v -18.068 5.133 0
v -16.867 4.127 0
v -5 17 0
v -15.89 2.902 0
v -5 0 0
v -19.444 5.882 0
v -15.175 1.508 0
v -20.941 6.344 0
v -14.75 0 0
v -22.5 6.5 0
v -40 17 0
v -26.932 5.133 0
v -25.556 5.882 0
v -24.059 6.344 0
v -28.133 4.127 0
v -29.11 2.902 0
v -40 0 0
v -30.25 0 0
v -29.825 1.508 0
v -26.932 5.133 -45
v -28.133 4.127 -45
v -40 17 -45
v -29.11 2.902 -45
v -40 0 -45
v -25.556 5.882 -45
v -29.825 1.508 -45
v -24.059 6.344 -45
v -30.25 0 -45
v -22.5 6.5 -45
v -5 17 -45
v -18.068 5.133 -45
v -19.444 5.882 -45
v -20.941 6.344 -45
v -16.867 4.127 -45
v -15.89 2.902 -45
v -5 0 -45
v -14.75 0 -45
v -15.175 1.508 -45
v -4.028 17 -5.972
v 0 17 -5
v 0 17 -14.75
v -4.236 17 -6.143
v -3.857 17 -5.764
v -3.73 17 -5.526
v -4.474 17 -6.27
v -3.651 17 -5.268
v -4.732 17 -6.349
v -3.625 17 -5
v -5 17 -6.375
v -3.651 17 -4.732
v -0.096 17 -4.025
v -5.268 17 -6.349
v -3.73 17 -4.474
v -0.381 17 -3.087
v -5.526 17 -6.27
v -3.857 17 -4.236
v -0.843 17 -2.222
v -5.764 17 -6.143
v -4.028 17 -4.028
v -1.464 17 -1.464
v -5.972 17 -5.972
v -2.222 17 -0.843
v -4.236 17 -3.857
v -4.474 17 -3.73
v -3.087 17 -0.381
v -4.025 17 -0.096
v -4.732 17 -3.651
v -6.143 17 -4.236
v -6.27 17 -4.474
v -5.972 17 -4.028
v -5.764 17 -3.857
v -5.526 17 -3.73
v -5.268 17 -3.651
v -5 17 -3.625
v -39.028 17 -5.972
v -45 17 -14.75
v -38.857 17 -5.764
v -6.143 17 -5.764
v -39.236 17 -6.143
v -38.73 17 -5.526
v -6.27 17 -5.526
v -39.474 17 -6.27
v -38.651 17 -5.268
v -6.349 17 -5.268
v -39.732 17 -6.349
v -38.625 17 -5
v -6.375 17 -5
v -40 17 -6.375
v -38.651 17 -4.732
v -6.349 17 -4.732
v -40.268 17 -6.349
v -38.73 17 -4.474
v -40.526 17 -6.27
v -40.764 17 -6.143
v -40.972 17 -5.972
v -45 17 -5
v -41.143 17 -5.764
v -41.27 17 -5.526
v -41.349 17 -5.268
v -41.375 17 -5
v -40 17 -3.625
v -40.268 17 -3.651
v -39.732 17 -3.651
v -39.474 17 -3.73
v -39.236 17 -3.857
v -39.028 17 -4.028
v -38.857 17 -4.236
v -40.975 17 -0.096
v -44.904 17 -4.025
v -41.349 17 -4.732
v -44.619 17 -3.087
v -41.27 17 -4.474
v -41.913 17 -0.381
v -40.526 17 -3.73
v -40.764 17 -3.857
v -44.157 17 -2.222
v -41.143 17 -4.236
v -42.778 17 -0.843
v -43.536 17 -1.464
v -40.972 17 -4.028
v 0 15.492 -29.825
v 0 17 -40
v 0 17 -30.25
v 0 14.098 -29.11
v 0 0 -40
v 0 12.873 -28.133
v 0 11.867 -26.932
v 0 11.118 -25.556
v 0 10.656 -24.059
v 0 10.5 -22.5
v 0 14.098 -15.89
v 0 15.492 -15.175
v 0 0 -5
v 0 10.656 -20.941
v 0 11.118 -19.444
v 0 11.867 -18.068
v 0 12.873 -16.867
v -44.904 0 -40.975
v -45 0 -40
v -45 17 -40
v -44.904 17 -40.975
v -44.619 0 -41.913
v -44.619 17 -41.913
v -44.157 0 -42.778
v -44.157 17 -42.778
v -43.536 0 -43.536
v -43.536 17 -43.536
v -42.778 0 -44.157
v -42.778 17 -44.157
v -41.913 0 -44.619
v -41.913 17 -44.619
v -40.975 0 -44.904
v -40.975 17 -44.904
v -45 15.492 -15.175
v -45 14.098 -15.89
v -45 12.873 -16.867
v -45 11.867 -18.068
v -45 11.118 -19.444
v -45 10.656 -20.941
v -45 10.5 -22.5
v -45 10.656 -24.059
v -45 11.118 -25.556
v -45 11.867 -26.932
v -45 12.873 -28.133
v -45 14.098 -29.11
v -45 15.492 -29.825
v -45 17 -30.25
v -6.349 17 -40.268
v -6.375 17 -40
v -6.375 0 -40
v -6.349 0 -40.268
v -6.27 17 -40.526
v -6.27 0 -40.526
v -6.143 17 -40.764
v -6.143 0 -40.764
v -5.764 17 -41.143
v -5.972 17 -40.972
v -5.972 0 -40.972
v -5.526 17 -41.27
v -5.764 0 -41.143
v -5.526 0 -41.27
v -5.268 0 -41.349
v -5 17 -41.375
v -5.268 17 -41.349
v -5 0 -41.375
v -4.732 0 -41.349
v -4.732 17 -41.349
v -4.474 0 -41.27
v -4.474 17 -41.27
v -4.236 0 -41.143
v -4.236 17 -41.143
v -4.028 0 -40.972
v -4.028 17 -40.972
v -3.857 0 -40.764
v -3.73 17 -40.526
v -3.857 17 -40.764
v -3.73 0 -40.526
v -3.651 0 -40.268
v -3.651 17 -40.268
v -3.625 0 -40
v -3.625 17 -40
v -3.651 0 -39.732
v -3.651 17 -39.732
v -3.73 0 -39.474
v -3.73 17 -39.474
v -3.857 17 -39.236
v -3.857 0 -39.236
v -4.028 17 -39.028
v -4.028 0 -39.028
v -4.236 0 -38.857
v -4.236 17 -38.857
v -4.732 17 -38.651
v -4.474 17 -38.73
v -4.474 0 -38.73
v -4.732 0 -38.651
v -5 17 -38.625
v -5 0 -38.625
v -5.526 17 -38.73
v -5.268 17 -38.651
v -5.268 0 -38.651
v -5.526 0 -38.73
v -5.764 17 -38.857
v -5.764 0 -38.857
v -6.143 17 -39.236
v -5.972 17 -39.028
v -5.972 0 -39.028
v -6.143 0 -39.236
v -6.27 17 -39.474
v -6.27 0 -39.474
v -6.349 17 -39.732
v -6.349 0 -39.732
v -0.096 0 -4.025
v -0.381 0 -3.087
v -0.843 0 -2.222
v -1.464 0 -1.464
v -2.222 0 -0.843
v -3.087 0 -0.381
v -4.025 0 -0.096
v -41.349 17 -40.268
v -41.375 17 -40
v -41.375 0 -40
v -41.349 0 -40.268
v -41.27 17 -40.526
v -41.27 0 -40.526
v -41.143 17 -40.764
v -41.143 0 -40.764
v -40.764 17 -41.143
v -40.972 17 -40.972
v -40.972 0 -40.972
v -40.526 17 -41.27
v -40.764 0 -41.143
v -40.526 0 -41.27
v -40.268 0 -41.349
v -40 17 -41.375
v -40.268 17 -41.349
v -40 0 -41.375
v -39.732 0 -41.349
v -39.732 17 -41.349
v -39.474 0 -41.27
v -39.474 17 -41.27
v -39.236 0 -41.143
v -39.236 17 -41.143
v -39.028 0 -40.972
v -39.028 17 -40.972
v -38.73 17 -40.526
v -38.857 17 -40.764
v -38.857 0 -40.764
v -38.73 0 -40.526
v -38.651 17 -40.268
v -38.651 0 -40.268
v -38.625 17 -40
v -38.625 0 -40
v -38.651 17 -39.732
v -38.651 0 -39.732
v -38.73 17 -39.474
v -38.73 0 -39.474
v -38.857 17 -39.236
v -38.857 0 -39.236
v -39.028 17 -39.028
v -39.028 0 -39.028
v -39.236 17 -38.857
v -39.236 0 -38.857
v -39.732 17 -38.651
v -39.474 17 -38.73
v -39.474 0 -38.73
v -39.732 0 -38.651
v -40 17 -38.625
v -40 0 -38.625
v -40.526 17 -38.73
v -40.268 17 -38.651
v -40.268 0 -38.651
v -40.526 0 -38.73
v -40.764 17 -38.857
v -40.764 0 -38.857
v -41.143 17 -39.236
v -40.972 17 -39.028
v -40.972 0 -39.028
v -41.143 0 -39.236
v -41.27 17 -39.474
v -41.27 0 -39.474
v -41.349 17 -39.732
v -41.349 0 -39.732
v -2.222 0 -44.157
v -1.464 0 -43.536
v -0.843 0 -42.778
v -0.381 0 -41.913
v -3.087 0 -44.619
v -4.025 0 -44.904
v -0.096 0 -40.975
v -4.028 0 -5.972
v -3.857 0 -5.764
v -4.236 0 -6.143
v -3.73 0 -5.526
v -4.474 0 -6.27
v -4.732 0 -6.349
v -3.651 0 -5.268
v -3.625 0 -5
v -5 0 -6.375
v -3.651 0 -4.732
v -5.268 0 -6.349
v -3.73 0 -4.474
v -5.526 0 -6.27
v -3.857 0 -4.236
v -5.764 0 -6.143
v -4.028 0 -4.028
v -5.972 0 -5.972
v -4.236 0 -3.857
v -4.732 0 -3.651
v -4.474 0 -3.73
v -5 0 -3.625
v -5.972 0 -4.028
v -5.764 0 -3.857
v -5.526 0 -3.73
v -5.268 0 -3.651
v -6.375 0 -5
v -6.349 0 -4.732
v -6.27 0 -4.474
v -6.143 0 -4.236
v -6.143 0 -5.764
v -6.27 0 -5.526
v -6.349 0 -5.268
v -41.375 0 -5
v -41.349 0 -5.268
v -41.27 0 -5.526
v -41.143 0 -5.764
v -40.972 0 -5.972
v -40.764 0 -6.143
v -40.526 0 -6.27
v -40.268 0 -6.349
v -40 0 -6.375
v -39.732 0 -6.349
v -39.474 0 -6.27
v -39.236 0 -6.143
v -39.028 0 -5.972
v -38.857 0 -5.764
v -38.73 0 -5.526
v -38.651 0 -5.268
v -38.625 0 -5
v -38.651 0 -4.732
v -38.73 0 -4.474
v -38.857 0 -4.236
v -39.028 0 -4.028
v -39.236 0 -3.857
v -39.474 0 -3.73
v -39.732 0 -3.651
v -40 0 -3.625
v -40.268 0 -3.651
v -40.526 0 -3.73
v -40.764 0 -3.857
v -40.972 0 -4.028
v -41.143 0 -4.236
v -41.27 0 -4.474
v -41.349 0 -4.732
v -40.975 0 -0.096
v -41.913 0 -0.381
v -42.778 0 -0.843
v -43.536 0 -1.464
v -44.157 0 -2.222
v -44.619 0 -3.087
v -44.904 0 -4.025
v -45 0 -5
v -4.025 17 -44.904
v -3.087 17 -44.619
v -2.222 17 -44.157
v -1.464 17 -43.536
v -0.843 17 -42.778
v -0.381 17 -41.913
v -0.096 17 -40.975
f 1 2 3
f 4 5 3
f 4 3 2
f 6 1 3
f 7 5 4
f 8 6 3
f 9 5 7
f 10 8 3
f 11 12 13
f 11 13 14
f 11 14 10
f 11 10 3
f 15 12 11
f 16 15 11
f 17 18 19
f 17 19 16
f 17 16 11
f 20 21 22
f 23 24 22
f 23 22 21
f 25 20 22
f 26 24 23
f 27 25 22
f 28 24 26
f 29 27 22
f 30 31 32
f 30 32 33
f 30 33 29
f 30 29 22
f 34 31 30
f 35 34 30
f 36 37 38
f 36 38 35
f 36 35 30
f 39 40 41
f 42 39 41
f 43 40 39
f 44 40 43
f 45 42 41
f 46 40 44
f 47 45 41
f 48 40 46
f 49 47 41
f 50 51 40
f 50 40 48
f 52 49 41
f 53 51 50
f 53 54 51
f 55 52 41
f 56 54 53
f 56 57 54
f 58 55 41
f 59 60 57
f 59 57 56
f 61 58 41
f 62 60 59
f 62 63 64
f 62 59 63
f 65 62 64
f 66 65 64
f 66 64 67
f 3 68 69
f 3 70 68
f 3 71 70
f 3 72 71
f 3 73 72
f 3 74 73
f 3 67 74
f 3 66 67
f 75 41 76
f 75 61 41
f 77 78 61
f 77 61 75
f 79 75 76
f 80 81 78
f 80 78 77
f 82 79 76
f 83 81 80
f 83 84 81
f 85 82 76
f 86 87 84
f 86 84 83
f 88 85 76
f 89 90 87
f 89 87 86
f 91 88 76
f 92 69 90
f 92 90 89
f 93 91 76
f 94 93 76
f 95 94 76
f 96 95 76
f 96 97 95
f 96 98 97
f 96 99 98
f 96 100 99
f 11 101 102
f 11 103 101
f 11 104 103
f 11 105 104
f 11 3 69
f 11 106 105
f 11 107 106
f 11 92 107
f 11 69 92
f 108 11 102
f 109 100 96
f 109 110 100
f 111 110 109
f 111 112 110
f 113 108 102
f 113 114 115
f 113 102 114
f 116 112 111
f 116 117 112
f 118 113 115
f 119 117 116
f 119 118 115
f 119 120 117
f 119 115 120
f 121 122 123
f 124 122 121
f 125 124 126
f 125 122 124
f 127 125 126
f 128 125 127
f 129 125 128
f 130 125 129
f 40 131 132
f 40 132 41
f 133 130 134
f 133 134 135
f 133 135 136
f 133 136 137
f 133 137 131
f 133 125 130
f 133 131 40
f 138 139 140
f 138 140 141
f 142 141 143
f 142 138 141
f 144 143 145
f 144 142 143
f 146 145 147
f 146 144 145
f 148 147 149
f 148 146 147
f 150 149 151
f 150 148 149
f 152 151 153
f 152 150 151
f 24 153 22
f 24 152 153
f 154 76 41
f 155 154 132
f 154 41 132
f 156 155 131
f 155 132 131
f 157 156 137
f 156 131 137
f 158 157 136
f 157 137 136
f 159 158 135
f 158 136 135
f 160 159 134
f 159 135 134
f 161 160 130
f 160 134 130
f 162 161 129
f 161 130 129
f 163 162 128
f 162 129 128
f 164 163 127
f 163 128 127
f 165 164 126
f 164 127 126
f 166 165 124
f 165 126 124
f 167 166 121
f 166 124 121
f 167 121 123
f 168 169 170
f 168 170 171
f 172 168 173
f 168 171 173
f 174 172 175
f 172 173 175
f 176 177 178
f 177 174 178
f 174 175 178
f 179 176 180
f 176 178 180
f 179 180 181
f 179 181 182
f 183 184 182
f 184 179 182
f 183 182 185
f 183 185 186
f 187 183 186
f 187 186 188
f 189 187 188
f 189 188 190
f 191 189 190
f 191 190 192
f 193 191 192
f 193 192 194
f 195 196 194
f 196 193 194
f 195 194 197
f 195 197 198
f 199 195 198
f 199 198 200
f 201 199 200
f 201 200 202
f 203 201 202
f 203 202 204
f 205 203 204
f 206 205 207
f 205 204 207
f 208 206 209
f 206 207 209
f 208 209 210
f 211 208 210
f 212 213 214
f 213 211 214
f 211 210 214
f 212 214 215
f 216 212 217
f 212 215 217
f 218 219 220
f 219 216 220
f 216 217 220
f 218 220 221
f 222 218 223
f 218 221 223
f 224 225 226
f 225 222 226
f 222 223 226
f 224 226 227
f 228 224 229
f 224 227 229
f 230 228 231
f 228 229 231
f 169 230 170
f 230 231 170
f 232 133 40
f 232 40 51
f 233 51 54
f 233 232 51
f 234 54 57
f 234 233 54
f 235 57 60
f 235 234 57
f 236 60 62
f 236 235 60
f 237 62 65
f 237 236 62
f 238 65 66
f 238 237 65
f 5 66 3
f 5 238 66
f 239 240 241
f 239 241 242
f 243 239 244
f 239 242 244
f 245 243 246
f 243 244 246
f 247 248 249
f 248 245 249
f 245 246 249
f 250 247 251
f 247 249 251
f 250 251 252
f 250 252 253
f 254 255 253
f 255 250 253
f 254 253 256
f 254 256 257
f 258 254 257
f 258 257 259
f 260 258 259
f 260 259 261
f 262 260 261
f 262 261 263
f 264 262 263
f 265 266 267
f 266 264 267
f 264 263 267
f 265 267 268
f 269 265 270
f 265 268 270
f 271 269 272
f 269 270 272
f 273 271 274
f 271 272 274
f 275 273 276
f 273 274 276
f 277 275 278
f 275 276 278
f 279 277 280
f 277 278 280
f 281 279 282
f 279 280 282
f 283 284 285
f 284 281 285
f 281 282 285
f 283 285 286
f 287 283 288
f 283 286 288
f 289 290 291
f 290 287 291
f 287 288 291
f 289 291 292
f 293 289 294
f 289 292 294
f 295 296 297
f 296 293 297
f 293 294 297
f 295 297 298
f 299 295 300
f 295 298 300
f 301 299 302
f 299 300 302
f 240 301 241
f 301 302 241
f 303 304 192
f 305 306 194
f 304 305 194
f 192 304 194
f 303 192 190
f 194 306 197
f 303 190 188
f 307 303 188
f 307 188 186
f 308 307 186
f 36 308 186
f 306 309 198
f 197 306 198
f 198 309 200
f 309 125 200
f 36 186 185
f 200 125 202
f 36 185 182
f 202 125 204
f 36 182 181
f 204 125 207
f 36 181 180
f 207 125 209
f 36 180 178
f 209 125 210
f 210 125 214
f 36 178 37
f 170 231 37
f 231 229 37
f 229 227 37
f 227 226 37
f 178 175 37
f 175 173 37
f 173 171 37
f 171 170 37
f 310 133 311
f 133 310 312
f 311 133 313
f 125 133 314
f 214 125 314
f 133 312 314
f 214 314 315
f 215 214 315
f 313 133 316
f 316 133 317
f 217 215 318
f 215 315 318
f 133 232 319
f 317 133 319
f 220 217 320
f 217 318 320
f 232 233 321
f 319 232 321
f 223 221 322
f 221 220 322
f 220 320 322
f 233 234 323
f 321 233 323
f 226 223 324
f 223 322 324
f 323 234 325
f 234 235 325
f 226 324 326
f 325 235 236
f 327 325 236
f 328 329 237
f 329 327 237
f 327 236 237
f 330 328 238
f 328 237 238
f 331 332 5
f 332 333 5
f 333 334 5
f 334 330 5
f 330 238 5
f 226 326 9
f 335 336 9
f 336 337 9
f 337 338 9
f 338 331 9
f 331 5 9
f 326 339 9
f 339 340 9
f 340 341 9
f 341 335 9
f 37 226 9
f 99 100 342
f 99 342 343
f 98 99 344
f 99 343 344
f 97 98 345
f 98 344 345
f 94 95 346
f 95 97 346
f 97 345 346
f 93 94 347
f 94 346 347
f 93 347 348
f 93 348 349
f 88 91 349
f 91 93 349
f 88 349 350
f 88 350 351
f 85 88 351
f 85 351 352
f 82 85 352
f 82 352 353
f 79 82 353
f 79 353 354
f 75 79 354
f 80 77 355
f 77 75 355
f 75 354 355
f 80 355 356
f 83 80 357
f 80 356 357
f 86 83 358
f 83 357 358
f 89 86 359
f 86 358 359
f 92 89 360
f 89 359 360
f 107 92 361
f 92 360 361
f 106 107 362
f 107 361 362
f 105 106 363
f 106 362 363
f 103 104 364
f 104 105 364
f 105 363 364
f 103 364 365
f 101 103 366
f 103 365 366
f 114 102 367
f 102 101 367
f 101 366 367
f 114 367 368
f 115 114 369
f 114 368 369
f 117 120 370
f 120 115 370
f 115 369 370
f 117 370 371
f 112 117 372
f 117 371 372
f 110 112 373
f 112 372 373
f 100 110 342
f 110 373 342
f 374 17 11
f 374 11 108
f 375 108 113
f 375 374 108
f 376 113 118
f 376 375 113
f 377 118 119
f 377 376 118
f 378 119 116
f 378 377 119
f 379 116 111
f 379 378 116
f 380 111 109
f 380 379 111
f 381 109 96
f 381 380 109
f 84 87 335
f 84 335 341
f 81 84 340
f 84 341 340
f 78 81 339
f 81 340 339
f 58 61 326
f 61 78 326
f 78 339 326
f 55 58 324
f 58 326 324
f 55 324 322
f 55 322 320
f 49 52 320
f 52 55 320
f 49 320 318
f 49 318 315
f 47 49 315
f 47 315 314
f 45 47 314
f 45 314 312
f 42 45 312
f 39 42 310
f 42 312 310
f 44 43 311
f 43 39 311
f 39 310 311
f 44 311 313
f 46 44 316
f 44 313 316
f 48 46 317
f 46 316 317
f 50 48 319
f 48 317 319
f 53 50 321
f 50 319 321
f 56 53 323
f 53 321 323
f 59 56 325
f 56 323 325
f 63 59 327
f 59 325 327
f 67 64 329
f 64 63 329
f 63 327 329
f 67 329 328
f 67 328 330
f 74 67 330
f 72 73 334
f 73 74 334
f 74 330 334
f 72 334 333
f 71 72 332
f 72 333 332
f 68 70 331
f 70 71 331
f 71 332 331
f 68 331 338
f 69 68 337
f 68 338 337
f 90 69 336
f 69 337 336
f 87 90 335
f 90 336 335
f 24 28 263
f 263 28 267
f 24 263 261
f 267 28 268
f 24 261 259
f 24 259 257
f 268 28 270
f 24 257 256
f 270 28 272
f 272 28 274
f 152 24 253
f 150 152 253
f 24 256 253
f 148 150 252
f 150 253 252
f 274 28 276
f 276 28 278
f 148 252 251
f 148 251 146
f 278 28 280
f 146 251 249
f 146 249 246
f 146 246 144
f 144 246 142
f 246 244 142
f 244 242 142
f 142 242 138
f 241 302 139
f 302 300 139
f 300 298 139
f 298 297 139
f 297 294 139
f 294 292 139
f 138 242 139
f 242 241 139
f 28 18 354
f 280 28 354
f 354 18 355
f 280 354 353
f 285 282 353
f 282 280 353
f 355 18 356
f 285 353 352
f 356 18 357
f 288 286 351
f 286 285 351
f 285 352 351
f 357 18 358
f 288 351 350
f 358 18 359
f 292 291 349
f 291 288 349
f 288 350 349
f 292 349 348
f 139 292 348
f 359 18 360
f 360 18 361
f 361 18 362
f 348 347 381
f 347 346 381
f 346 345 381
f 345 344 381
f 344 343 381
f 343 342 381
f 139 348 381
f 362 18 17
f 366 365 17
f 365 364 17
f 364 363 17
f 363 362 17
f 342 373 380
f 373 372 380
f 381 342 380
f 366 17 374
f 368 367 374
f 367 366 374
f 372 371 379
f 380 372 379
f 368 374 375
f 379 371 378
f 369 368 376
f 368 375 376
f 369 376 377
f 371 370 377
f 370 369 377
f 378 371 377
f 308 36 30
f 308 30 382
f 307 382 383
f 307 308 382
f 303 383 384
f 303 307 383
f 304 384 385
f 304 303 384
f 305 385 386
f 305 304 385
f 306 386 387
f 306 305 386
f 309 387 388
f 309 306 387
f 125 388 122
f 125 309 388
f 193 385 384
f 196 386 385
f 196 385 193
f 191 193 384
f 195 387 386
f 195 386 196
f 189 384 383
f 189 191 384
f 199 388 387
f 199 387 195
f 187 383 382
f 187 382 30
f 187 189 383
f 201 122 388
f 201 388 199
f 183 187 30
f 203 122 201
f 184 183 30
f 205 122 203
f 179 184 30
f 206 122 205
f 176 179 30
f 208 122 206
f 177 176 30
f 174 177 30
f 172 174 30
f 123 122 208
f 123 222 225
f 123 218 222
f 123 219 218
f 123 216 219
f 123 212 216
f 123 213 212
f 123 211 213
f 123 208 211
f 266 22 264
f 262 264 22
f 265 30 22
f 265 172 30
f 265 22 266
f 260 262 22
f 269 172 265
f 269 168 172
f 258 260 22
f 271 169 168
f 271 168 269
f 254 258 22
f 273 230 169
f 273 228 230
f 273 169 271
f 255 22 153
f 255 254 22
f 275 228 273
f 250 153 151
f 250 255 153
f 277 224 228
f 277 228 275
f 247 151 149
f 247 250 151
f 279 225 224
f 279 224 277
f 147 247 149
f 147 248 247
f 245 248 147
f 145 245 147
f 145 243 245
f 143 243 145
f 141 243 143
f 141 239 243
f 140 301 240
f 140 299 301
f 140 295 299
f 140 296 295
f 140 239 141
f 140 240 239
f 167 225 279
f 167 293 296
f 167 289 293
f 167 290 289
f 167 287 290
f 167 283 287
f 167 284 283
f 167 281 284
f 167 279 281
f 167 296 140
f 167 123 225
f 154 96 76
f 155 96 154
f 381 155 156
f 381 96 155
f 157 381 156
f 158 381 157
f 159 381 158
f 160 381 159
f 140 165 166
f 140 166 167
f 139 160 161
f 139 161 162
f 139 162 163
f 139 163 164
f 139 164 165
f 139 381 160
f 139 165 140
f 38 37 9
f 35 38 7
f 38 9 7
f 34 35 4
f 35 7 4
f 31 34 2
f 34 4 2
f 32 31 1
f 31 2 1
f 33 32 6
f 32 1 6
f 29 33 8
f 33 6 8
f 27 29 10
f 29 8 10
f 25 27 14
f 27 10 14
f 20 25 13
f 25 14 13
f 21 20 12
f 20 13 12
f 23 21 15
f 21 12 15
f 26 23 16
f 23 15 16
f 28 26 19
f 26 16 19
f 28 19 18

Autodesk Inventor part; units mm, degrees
ref_plane "YZ Plane" through (0, 0, 0) normal (1, 0, 0) x (0, 1, 0)
ref_plane "XZ Plane" through (0, 0, 0) normal (0, 1, 0) x (-1, 0, 0)
ref_plane "XY Plane" through (0, 0, 0) normal (0, 0, 1) x (1, 0, 0)
sketch "Sketch1" plane through (0, 0, 0) normal (0, 1, 0) x (-1, 0, 0)
  line L0 (45, -5) -> (45, -14.75)
  line L1 (45, -14.75) -> (45, -30.25)
  line L2 (45, -30.25) -> (45, -40)
  arc A0 (40, -45) -> (45, -40) centre (40, -40) ccw
  circle A1 centre (40, -40) radius 1.375
  circle A2 centre (40, -5) radius 1.375
  arc A3 (45, -5) -> (40, 0) centre (40, -5) ccw
  line L3 (5, 0) -> (40, 0)
  circle A4 centre (5, -5) radius 1.375
  arc A5 (5, 0) -> (0, -5) centre (5, -5) ccw
  line L4 (0, -14.75) -> (0, -5)
  line L5 (0, -30.25) -> (0, -14.75)
  line L6 (0, -40) -> (0, -30.25)
  arc A6 (0, -40) -> (5, -45) centre (5, -40) ccw
  line L7 (40, -45) -> (5, -45)
  circle A7 centre (5, -40) radius 1.375
  point P0 (0, 0)
  point P1 (0, 0)
extrude "Extrusion1" add sketch "Sketch1" along normal blind 17
sketch "Sketch2" plane through (0, 0, -5) normal (1, 0, 0) x (0, 0, -1)
  line L0 (35, 0) -> (0, 0) projected
  line L1 (35, 0) -> (35, 17) projected
  line L2 (0, 17) -> (35, 17) projected
  line L3 (0, 0) -> (0, 17) projected
  line L4 (-5, 0) -> (-5, 17) projected
  line L5 (40, 0) -> (35, 0) projected
  line L6 (40, 0) -> (40, 17) projected
  line L7 (35, 17) -> (40, 17) projected
  line L8 (35, 0) -> (35, 17) projected
  line L9 (0, 0) -> (-5, 0) projected
  line L10 (0, 0) -> (0, 17) projected
  line L11 (-5, 17) -> (0, 17) projected
  line L12 (-5, 0) -> (-5, 17) projected
  line L13 (35, 17) -> (0, 17) projected
  line L14 (0, 0) -> (35, 0) projected
  line L15 (17.5, 17) -> (25.25, 17)
  line L16 (25.25, 17) -> (9.75, 17)
  line L17 (17.5, 17) -> (17.5, 10.5)
  arc A0 (9.75, 17) -> (25.25, 17) centre (17.5, 18.3702) ccw
  dimension "d8" = 7.75
  dimension "d9" = 15.5
  dimension "d10" = 6.5
extrude "Extrusion2" cut sketch "Sketch2" against normal blind 45 contours A0 L17 L2 | L2 L17 A0
sketch "Sketch3" plane through (-40, 0, 0) normal (0, 0, 1) x (1, 0, 0)
  line L0 (35, 0) -> (0, 0) projected
  line L1 (35, 0) -> (35, 17) projected
  line L2 (0, 17) -> (35, 17) construction
  line L3 (0, 0) -> (0, 17) projected
  line L4 (17.5, 0) -> (9.75, 0)
  line L5 (9.75, 0) -> (25.25, 0)
  line L6 (17.5, 0) -> (17.5, 6.5)
  arc A0 (25.25, 0) -> (9.75, 0) centre (17.5, -1.3702) ccw
  line L7 (35, 0) -> (0, 0) projected
  point P0 (40, 0)
  point P1 (17.5, 0)
  dimension "d13" = 7.75
  dimension "d14" = 15.5
  dimension "d15" = 6.5
extrude "Extrusion3" cut sketch "Sketch3" against normal blind 45
properties part number "Middle" material "PC/ABS Plastic"
